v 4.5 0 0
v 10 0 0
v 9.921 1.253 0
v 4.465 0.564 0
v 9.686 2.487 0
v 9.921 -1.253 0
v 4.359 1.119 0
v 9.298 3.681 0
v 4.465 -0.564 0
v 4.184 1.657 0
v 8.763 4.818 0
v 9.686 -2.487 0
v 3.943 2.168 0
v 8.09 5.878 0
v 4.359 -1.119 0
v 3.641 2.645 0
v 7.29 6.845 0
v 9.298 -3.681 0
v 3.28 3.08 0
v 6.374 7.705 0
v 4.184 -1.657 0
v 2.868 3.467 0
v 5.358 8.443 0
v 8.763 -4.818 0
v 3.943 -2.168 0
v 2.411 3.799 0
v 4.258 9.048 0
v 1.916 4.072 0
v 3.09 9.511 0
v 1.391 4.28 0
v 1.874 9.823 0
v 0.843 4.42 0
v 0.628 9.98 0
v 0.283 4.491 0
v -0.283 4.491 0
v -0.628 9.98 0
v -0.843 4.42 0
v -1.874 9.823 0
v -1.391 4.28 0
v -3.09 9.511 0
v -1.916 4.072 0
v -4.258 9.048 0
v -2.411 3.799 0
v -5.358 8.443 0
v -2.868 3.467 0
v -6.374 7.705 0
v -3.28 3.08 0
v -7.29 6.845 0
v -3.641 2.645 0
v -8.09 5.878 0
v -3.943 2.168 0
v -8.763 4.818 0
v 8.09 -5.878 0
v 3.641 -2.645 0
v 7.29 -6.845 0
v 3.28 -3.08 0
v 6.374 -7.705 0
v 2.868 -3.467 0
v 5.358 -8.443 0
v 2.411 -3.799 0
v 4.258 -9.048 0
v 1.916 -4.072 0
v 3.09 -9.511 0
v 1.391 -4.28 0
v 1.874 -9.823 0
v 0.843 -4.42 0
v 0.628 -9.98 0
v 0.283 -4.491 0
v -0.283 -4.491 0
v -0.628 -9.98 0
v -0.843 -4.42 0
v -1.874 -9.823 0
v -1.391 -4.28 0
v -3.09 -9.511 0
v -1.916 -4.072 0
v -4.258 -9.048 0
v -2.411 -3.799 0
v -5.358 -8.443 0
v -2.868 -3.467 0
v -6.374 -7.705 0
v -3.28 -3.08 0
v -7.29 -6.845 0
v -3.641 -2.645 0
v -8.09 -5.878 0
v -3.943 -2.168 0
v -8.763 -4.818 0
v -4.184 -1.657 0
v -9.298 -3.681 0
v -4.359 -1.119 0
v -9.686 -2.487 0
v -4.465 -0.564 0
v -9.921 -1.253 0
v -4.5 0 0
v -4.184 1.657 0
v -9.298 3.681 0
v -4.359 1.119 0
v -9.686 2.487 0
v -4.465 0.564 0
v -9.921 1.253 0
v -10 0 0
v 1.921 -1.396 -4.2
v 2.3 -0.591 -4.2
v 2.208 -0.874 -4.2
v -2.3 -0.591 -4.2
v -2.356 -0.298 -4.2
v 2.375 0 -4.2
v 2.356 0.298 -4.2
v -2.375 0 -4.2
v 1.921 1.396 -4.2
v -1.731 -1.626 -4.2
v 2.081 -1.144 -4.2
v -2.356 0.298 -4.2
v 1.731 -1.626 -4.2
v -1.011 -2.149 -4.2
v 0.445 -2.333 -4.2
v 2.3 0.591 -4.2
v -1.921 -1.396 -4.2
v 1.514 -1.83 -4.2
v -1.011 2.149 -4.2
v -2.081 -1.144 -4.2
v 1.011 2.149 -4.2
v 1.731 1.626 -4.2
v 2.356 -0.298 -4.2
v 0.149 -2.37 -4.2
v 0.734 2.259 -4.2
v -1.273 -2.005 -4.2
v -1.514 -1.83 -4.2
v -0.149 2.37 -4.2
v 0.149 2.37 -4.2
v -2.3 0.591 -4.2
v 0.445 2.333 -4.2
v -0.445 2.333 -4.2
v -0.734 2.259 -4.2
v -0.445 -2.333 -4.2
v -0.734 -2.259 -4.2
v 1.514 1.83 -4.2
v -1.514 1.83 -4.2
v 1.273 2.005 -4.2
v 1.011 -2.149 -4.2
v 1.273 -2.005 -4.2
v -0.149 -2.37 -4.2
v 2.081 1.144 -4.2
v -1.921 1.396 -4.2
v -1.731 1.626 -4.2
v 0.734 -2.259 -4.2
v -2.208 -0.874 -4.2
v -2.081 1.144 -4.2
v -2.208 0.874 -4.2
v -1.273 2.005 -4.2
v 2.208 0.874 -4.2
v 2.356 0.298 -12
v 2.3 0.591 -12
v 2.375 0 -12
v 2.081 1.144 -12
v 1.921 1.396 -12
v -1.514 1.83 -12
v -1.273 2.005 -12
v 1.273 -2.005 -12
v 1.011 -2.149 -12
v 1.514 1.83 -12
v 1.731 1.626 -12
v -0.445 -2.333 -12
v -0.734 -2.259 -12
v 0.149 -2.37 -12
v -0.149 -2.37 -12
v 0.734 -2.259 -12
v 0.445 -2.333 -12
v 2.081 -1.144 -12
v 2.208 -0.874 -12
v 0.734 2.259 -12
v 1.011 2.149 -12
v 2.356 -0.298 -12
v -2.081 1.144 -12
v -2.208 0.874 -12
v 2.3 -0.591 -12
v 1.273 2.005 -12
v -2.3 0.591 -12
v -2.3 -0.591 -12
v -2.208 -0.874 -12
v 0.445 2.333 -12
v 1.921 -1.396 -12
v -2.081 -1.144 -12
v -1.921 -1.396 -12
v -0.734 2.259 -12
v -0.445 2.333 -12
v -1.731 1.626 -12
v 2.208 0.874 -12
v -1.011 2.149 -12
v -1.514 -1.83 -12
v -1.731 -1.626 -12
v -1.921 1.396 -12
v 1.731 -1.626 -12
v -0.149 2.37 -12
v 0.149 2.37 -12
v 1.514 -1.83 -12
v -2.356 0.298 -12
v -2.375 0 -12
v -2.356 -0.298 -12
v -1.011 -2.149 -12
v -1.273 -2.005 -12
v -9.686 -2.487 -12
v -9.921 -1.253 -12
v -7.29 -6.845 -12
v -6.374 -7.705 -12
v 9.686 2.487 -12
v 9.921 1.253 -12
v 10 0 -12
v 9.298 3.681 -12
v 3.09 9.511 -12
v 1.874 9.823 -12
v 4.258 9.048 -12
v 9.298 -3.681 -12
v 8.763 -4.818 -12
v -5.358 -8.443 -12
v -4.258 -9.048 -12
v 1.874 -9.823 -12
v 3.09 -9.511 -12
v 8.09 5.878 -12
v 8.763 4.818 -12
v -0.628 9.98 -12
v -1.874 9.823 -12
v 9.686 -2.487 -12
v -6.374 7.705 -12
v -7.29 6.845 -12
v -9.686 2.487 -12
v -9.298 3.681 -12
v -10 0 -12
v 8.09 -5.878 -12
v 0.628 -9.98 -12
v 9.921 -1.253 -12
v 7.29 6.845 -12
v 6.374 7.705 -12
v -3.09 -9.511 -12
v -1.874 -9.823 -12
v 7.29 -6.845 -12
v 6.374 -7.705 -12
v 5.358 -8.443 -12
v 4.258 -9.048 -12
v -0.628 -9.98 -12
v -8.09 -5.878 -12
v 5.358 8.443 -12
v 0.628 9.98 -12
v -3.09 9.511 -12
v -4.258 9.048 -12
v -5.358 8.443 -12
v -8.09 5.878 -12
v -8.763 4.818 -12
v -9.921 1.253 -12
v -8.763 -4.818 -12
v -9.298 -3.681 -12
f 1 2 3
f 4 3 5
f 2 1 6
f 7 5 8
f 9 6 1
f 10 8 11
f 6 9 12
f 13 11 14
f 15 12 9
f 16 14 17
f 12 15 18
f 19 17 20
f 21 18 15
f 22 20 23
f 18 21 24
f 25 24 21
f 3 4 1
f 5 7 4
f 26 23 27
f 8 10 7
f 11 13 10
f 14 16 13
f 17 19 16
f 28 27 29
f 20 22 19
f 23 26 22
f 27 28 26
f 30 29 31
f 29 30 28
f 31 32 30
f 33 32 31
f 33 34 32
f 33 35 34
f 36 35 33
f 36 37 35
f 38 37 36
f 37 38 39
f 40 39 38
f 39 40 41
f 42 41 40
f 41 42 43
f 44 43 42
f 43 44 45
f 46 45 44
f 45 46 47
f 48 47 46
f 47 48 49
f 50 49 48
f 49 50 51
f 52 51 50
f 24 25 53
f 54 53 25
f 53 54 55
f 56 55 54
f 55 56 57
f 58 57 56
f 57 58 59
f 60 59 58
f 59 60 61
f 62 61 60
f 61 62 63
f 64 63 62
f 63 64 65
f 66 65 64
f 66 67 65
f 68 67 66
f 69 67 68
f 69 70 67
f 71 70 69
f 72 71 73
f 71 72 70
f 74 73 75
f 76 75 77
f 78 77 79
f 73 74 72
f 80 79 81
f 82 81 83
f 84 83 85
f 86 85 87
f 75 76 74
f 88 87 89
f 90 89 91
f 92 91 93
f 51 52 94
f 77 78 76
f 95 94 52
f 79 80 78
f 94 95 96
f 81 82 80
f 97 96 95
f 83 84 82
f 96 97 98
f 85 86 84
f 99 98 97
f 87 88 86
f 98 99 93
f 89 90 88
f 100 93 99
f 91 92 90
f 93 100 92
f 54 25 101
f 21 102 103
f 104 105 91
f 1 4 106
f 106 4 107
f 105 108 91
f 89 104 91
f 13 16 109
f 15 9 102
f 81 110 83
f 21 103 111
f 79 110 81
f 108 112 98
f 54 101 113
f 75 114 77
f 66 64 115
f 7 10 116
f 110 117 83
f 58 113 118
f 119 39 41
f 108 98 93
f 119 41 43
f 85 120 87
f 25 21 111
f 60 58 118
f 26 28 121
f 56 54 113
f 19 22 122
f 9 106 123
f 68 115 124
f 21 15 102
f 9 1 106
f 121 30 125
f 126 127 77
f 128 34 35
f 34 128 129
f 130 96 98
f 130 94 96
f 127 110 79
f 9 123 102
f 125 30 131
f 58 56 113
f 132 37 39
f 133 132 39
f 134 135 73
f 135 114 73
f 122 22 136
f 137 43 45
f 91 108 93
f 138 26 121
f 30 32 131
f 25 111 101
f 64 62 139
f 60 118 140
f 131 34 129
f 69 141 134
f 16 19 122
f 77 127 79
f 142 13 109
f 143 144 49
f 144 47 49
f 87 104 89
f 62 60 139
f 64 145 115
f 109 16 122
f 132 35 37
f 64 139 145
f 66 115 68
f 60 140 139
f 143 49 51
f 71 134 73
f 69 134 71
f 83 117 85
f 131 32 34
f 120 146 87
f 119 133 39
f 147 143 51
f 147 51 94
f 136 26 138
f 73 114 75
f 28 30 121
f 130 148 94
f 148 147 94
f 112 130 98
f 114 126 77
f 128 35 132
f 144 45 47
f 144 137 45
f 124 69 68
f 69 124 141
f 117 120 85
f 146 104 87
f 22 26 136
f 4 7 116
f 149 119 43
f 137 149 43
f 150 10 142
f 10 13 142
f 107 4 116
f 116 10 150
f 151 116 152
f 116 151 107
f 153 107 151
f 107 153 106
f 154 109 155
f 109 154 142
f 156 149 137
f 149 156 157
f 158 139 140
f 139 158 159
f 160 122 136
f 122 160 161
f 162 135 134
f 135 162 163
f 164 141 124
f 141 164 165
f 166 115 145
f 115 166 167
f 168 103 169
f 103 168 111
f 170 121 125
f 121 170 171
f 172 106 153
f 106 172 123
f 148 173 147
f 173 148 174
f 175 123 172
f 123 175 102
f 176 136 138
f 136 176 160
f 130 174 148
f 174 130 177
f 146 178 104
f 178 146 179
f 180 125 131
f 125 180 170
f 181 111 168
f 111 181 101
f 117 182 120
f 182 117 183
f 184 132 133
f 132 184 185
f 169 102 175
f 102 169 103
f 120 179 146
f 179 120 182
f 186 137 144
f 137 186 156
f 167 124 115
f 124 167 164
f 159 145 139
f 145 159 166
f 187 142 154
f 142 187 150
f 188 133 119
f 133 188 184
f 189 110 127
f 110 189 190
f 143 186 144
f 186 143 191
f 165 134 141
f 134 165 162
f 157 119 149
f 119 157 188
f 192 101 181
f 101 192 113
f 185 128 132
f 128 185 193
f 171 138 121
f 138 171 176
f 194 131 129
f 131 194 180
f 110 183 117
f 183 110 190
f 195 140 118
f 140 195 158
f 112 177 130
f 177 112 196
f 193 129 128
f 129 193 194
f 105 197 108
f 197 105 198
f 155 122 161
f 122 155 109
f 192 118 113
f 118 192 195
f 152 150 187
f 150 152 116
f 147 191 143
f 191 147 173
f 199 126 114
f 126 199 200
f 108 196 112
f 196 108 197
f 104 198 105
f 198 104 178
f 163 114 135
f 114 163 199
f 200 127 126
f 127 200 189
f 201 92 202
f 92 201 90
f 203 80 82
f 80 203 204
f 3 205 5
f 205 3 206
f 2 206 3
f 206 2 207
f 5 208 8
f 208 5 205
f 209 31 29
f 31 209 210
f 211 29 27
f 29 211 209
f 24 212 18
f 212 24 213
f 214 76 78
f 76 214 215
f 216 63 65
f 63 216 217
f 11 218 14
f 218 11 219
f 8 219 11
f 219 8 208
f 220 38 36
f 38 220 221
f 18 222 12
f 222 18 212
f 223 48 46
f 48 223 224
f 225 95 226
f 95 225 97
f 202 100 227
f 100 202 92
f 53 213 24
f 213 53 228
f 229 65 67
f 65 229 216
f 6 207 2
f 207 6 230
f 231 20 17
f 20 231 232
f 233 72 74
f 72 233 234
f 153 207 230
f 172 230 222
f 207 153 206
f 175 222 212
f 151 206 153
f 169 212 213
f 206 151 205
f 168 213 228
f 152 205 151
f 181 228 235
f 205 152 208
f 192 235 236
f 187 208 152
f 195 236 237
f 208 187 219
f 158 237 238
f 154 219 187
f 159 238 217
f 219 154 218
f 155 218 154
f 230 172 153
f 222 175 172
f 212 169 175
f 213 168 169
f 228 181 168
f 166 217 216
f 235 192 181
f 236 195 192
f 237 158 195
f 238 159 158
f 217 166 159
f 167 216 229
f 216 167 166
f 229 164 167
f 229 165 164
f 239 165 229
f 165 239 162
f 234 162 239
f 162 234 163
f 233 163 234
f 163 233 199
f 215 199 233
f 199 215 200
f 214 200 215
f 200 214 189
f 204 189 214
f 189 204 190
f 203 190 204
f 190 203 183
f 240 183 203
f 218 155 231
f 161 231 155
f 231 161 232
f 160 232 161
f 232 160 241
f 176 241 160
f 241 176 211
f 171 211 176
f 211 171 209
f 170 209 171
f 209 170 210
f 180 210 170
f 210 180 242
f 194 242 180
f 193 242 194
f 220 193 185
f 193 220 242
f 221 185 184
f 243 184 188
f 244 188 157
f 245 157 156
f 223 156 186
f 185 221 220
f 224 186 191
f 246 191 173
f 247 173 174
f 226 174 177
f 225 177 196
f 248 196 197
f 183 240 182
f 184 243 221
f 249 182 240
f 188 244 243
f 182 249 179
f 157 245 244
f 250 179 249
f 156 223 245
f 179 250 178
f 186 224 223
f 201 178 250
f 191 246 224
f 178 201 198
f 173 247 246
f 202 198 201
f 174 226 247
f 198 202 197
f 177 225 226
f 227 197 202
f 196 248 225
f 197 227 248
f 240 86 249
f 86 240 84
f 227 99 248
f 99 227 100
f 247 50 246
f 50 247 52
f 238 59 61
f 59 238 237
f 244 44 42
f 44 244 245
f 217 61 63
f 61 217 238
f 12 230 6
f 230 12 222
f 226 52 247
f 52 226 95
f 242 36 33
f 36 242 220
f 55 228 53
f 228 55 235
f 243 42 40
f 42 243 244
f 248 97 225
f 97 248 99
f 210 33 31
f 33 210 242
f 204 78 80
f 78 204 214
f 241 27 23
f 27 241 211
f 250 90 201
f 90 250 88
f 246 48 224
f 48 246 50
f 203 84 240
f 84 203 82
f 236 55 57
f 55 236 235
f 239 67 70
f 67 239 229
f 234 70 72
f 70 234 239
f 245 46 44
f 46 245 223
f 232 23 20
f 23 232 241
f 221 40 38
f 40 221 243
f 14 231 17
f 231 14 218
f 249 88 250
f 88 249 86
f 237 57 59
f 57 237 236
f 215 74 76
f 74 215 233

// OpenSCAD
$fn = 50;


difference() {
	union() {
		translate(v = [0, 0, -12.0000000000]) {
			cylinder(h = 12, r = 10.0000000000);
		}
	}
	union() {
		translate(v = [0, 0, 0]) {
			rotate(a = [0, 0, 0]) {
				difference() {
					union() {
						translate(v = [0, 0, -15.0000000000]) {
							cylinder(h = 15, r = 2.2500000000);
						}
						translate(v = [0, 0, -4.2000000000]) {
							cylinder(h = 4.2000000000, r1 = 2.3750000000, r2 = 4.5000000000);
						}
						translate(v = [0, 0, -15.0000000000]) {
							cylinder(h = 15, r = 2.3750000000);
						}
						translate(v = [0, 0, -15.0000000000]) {
							cylinder(h = 15, r = 2.2500000000);
						}
					}
					union();
				}
			}
		}
	}
}
